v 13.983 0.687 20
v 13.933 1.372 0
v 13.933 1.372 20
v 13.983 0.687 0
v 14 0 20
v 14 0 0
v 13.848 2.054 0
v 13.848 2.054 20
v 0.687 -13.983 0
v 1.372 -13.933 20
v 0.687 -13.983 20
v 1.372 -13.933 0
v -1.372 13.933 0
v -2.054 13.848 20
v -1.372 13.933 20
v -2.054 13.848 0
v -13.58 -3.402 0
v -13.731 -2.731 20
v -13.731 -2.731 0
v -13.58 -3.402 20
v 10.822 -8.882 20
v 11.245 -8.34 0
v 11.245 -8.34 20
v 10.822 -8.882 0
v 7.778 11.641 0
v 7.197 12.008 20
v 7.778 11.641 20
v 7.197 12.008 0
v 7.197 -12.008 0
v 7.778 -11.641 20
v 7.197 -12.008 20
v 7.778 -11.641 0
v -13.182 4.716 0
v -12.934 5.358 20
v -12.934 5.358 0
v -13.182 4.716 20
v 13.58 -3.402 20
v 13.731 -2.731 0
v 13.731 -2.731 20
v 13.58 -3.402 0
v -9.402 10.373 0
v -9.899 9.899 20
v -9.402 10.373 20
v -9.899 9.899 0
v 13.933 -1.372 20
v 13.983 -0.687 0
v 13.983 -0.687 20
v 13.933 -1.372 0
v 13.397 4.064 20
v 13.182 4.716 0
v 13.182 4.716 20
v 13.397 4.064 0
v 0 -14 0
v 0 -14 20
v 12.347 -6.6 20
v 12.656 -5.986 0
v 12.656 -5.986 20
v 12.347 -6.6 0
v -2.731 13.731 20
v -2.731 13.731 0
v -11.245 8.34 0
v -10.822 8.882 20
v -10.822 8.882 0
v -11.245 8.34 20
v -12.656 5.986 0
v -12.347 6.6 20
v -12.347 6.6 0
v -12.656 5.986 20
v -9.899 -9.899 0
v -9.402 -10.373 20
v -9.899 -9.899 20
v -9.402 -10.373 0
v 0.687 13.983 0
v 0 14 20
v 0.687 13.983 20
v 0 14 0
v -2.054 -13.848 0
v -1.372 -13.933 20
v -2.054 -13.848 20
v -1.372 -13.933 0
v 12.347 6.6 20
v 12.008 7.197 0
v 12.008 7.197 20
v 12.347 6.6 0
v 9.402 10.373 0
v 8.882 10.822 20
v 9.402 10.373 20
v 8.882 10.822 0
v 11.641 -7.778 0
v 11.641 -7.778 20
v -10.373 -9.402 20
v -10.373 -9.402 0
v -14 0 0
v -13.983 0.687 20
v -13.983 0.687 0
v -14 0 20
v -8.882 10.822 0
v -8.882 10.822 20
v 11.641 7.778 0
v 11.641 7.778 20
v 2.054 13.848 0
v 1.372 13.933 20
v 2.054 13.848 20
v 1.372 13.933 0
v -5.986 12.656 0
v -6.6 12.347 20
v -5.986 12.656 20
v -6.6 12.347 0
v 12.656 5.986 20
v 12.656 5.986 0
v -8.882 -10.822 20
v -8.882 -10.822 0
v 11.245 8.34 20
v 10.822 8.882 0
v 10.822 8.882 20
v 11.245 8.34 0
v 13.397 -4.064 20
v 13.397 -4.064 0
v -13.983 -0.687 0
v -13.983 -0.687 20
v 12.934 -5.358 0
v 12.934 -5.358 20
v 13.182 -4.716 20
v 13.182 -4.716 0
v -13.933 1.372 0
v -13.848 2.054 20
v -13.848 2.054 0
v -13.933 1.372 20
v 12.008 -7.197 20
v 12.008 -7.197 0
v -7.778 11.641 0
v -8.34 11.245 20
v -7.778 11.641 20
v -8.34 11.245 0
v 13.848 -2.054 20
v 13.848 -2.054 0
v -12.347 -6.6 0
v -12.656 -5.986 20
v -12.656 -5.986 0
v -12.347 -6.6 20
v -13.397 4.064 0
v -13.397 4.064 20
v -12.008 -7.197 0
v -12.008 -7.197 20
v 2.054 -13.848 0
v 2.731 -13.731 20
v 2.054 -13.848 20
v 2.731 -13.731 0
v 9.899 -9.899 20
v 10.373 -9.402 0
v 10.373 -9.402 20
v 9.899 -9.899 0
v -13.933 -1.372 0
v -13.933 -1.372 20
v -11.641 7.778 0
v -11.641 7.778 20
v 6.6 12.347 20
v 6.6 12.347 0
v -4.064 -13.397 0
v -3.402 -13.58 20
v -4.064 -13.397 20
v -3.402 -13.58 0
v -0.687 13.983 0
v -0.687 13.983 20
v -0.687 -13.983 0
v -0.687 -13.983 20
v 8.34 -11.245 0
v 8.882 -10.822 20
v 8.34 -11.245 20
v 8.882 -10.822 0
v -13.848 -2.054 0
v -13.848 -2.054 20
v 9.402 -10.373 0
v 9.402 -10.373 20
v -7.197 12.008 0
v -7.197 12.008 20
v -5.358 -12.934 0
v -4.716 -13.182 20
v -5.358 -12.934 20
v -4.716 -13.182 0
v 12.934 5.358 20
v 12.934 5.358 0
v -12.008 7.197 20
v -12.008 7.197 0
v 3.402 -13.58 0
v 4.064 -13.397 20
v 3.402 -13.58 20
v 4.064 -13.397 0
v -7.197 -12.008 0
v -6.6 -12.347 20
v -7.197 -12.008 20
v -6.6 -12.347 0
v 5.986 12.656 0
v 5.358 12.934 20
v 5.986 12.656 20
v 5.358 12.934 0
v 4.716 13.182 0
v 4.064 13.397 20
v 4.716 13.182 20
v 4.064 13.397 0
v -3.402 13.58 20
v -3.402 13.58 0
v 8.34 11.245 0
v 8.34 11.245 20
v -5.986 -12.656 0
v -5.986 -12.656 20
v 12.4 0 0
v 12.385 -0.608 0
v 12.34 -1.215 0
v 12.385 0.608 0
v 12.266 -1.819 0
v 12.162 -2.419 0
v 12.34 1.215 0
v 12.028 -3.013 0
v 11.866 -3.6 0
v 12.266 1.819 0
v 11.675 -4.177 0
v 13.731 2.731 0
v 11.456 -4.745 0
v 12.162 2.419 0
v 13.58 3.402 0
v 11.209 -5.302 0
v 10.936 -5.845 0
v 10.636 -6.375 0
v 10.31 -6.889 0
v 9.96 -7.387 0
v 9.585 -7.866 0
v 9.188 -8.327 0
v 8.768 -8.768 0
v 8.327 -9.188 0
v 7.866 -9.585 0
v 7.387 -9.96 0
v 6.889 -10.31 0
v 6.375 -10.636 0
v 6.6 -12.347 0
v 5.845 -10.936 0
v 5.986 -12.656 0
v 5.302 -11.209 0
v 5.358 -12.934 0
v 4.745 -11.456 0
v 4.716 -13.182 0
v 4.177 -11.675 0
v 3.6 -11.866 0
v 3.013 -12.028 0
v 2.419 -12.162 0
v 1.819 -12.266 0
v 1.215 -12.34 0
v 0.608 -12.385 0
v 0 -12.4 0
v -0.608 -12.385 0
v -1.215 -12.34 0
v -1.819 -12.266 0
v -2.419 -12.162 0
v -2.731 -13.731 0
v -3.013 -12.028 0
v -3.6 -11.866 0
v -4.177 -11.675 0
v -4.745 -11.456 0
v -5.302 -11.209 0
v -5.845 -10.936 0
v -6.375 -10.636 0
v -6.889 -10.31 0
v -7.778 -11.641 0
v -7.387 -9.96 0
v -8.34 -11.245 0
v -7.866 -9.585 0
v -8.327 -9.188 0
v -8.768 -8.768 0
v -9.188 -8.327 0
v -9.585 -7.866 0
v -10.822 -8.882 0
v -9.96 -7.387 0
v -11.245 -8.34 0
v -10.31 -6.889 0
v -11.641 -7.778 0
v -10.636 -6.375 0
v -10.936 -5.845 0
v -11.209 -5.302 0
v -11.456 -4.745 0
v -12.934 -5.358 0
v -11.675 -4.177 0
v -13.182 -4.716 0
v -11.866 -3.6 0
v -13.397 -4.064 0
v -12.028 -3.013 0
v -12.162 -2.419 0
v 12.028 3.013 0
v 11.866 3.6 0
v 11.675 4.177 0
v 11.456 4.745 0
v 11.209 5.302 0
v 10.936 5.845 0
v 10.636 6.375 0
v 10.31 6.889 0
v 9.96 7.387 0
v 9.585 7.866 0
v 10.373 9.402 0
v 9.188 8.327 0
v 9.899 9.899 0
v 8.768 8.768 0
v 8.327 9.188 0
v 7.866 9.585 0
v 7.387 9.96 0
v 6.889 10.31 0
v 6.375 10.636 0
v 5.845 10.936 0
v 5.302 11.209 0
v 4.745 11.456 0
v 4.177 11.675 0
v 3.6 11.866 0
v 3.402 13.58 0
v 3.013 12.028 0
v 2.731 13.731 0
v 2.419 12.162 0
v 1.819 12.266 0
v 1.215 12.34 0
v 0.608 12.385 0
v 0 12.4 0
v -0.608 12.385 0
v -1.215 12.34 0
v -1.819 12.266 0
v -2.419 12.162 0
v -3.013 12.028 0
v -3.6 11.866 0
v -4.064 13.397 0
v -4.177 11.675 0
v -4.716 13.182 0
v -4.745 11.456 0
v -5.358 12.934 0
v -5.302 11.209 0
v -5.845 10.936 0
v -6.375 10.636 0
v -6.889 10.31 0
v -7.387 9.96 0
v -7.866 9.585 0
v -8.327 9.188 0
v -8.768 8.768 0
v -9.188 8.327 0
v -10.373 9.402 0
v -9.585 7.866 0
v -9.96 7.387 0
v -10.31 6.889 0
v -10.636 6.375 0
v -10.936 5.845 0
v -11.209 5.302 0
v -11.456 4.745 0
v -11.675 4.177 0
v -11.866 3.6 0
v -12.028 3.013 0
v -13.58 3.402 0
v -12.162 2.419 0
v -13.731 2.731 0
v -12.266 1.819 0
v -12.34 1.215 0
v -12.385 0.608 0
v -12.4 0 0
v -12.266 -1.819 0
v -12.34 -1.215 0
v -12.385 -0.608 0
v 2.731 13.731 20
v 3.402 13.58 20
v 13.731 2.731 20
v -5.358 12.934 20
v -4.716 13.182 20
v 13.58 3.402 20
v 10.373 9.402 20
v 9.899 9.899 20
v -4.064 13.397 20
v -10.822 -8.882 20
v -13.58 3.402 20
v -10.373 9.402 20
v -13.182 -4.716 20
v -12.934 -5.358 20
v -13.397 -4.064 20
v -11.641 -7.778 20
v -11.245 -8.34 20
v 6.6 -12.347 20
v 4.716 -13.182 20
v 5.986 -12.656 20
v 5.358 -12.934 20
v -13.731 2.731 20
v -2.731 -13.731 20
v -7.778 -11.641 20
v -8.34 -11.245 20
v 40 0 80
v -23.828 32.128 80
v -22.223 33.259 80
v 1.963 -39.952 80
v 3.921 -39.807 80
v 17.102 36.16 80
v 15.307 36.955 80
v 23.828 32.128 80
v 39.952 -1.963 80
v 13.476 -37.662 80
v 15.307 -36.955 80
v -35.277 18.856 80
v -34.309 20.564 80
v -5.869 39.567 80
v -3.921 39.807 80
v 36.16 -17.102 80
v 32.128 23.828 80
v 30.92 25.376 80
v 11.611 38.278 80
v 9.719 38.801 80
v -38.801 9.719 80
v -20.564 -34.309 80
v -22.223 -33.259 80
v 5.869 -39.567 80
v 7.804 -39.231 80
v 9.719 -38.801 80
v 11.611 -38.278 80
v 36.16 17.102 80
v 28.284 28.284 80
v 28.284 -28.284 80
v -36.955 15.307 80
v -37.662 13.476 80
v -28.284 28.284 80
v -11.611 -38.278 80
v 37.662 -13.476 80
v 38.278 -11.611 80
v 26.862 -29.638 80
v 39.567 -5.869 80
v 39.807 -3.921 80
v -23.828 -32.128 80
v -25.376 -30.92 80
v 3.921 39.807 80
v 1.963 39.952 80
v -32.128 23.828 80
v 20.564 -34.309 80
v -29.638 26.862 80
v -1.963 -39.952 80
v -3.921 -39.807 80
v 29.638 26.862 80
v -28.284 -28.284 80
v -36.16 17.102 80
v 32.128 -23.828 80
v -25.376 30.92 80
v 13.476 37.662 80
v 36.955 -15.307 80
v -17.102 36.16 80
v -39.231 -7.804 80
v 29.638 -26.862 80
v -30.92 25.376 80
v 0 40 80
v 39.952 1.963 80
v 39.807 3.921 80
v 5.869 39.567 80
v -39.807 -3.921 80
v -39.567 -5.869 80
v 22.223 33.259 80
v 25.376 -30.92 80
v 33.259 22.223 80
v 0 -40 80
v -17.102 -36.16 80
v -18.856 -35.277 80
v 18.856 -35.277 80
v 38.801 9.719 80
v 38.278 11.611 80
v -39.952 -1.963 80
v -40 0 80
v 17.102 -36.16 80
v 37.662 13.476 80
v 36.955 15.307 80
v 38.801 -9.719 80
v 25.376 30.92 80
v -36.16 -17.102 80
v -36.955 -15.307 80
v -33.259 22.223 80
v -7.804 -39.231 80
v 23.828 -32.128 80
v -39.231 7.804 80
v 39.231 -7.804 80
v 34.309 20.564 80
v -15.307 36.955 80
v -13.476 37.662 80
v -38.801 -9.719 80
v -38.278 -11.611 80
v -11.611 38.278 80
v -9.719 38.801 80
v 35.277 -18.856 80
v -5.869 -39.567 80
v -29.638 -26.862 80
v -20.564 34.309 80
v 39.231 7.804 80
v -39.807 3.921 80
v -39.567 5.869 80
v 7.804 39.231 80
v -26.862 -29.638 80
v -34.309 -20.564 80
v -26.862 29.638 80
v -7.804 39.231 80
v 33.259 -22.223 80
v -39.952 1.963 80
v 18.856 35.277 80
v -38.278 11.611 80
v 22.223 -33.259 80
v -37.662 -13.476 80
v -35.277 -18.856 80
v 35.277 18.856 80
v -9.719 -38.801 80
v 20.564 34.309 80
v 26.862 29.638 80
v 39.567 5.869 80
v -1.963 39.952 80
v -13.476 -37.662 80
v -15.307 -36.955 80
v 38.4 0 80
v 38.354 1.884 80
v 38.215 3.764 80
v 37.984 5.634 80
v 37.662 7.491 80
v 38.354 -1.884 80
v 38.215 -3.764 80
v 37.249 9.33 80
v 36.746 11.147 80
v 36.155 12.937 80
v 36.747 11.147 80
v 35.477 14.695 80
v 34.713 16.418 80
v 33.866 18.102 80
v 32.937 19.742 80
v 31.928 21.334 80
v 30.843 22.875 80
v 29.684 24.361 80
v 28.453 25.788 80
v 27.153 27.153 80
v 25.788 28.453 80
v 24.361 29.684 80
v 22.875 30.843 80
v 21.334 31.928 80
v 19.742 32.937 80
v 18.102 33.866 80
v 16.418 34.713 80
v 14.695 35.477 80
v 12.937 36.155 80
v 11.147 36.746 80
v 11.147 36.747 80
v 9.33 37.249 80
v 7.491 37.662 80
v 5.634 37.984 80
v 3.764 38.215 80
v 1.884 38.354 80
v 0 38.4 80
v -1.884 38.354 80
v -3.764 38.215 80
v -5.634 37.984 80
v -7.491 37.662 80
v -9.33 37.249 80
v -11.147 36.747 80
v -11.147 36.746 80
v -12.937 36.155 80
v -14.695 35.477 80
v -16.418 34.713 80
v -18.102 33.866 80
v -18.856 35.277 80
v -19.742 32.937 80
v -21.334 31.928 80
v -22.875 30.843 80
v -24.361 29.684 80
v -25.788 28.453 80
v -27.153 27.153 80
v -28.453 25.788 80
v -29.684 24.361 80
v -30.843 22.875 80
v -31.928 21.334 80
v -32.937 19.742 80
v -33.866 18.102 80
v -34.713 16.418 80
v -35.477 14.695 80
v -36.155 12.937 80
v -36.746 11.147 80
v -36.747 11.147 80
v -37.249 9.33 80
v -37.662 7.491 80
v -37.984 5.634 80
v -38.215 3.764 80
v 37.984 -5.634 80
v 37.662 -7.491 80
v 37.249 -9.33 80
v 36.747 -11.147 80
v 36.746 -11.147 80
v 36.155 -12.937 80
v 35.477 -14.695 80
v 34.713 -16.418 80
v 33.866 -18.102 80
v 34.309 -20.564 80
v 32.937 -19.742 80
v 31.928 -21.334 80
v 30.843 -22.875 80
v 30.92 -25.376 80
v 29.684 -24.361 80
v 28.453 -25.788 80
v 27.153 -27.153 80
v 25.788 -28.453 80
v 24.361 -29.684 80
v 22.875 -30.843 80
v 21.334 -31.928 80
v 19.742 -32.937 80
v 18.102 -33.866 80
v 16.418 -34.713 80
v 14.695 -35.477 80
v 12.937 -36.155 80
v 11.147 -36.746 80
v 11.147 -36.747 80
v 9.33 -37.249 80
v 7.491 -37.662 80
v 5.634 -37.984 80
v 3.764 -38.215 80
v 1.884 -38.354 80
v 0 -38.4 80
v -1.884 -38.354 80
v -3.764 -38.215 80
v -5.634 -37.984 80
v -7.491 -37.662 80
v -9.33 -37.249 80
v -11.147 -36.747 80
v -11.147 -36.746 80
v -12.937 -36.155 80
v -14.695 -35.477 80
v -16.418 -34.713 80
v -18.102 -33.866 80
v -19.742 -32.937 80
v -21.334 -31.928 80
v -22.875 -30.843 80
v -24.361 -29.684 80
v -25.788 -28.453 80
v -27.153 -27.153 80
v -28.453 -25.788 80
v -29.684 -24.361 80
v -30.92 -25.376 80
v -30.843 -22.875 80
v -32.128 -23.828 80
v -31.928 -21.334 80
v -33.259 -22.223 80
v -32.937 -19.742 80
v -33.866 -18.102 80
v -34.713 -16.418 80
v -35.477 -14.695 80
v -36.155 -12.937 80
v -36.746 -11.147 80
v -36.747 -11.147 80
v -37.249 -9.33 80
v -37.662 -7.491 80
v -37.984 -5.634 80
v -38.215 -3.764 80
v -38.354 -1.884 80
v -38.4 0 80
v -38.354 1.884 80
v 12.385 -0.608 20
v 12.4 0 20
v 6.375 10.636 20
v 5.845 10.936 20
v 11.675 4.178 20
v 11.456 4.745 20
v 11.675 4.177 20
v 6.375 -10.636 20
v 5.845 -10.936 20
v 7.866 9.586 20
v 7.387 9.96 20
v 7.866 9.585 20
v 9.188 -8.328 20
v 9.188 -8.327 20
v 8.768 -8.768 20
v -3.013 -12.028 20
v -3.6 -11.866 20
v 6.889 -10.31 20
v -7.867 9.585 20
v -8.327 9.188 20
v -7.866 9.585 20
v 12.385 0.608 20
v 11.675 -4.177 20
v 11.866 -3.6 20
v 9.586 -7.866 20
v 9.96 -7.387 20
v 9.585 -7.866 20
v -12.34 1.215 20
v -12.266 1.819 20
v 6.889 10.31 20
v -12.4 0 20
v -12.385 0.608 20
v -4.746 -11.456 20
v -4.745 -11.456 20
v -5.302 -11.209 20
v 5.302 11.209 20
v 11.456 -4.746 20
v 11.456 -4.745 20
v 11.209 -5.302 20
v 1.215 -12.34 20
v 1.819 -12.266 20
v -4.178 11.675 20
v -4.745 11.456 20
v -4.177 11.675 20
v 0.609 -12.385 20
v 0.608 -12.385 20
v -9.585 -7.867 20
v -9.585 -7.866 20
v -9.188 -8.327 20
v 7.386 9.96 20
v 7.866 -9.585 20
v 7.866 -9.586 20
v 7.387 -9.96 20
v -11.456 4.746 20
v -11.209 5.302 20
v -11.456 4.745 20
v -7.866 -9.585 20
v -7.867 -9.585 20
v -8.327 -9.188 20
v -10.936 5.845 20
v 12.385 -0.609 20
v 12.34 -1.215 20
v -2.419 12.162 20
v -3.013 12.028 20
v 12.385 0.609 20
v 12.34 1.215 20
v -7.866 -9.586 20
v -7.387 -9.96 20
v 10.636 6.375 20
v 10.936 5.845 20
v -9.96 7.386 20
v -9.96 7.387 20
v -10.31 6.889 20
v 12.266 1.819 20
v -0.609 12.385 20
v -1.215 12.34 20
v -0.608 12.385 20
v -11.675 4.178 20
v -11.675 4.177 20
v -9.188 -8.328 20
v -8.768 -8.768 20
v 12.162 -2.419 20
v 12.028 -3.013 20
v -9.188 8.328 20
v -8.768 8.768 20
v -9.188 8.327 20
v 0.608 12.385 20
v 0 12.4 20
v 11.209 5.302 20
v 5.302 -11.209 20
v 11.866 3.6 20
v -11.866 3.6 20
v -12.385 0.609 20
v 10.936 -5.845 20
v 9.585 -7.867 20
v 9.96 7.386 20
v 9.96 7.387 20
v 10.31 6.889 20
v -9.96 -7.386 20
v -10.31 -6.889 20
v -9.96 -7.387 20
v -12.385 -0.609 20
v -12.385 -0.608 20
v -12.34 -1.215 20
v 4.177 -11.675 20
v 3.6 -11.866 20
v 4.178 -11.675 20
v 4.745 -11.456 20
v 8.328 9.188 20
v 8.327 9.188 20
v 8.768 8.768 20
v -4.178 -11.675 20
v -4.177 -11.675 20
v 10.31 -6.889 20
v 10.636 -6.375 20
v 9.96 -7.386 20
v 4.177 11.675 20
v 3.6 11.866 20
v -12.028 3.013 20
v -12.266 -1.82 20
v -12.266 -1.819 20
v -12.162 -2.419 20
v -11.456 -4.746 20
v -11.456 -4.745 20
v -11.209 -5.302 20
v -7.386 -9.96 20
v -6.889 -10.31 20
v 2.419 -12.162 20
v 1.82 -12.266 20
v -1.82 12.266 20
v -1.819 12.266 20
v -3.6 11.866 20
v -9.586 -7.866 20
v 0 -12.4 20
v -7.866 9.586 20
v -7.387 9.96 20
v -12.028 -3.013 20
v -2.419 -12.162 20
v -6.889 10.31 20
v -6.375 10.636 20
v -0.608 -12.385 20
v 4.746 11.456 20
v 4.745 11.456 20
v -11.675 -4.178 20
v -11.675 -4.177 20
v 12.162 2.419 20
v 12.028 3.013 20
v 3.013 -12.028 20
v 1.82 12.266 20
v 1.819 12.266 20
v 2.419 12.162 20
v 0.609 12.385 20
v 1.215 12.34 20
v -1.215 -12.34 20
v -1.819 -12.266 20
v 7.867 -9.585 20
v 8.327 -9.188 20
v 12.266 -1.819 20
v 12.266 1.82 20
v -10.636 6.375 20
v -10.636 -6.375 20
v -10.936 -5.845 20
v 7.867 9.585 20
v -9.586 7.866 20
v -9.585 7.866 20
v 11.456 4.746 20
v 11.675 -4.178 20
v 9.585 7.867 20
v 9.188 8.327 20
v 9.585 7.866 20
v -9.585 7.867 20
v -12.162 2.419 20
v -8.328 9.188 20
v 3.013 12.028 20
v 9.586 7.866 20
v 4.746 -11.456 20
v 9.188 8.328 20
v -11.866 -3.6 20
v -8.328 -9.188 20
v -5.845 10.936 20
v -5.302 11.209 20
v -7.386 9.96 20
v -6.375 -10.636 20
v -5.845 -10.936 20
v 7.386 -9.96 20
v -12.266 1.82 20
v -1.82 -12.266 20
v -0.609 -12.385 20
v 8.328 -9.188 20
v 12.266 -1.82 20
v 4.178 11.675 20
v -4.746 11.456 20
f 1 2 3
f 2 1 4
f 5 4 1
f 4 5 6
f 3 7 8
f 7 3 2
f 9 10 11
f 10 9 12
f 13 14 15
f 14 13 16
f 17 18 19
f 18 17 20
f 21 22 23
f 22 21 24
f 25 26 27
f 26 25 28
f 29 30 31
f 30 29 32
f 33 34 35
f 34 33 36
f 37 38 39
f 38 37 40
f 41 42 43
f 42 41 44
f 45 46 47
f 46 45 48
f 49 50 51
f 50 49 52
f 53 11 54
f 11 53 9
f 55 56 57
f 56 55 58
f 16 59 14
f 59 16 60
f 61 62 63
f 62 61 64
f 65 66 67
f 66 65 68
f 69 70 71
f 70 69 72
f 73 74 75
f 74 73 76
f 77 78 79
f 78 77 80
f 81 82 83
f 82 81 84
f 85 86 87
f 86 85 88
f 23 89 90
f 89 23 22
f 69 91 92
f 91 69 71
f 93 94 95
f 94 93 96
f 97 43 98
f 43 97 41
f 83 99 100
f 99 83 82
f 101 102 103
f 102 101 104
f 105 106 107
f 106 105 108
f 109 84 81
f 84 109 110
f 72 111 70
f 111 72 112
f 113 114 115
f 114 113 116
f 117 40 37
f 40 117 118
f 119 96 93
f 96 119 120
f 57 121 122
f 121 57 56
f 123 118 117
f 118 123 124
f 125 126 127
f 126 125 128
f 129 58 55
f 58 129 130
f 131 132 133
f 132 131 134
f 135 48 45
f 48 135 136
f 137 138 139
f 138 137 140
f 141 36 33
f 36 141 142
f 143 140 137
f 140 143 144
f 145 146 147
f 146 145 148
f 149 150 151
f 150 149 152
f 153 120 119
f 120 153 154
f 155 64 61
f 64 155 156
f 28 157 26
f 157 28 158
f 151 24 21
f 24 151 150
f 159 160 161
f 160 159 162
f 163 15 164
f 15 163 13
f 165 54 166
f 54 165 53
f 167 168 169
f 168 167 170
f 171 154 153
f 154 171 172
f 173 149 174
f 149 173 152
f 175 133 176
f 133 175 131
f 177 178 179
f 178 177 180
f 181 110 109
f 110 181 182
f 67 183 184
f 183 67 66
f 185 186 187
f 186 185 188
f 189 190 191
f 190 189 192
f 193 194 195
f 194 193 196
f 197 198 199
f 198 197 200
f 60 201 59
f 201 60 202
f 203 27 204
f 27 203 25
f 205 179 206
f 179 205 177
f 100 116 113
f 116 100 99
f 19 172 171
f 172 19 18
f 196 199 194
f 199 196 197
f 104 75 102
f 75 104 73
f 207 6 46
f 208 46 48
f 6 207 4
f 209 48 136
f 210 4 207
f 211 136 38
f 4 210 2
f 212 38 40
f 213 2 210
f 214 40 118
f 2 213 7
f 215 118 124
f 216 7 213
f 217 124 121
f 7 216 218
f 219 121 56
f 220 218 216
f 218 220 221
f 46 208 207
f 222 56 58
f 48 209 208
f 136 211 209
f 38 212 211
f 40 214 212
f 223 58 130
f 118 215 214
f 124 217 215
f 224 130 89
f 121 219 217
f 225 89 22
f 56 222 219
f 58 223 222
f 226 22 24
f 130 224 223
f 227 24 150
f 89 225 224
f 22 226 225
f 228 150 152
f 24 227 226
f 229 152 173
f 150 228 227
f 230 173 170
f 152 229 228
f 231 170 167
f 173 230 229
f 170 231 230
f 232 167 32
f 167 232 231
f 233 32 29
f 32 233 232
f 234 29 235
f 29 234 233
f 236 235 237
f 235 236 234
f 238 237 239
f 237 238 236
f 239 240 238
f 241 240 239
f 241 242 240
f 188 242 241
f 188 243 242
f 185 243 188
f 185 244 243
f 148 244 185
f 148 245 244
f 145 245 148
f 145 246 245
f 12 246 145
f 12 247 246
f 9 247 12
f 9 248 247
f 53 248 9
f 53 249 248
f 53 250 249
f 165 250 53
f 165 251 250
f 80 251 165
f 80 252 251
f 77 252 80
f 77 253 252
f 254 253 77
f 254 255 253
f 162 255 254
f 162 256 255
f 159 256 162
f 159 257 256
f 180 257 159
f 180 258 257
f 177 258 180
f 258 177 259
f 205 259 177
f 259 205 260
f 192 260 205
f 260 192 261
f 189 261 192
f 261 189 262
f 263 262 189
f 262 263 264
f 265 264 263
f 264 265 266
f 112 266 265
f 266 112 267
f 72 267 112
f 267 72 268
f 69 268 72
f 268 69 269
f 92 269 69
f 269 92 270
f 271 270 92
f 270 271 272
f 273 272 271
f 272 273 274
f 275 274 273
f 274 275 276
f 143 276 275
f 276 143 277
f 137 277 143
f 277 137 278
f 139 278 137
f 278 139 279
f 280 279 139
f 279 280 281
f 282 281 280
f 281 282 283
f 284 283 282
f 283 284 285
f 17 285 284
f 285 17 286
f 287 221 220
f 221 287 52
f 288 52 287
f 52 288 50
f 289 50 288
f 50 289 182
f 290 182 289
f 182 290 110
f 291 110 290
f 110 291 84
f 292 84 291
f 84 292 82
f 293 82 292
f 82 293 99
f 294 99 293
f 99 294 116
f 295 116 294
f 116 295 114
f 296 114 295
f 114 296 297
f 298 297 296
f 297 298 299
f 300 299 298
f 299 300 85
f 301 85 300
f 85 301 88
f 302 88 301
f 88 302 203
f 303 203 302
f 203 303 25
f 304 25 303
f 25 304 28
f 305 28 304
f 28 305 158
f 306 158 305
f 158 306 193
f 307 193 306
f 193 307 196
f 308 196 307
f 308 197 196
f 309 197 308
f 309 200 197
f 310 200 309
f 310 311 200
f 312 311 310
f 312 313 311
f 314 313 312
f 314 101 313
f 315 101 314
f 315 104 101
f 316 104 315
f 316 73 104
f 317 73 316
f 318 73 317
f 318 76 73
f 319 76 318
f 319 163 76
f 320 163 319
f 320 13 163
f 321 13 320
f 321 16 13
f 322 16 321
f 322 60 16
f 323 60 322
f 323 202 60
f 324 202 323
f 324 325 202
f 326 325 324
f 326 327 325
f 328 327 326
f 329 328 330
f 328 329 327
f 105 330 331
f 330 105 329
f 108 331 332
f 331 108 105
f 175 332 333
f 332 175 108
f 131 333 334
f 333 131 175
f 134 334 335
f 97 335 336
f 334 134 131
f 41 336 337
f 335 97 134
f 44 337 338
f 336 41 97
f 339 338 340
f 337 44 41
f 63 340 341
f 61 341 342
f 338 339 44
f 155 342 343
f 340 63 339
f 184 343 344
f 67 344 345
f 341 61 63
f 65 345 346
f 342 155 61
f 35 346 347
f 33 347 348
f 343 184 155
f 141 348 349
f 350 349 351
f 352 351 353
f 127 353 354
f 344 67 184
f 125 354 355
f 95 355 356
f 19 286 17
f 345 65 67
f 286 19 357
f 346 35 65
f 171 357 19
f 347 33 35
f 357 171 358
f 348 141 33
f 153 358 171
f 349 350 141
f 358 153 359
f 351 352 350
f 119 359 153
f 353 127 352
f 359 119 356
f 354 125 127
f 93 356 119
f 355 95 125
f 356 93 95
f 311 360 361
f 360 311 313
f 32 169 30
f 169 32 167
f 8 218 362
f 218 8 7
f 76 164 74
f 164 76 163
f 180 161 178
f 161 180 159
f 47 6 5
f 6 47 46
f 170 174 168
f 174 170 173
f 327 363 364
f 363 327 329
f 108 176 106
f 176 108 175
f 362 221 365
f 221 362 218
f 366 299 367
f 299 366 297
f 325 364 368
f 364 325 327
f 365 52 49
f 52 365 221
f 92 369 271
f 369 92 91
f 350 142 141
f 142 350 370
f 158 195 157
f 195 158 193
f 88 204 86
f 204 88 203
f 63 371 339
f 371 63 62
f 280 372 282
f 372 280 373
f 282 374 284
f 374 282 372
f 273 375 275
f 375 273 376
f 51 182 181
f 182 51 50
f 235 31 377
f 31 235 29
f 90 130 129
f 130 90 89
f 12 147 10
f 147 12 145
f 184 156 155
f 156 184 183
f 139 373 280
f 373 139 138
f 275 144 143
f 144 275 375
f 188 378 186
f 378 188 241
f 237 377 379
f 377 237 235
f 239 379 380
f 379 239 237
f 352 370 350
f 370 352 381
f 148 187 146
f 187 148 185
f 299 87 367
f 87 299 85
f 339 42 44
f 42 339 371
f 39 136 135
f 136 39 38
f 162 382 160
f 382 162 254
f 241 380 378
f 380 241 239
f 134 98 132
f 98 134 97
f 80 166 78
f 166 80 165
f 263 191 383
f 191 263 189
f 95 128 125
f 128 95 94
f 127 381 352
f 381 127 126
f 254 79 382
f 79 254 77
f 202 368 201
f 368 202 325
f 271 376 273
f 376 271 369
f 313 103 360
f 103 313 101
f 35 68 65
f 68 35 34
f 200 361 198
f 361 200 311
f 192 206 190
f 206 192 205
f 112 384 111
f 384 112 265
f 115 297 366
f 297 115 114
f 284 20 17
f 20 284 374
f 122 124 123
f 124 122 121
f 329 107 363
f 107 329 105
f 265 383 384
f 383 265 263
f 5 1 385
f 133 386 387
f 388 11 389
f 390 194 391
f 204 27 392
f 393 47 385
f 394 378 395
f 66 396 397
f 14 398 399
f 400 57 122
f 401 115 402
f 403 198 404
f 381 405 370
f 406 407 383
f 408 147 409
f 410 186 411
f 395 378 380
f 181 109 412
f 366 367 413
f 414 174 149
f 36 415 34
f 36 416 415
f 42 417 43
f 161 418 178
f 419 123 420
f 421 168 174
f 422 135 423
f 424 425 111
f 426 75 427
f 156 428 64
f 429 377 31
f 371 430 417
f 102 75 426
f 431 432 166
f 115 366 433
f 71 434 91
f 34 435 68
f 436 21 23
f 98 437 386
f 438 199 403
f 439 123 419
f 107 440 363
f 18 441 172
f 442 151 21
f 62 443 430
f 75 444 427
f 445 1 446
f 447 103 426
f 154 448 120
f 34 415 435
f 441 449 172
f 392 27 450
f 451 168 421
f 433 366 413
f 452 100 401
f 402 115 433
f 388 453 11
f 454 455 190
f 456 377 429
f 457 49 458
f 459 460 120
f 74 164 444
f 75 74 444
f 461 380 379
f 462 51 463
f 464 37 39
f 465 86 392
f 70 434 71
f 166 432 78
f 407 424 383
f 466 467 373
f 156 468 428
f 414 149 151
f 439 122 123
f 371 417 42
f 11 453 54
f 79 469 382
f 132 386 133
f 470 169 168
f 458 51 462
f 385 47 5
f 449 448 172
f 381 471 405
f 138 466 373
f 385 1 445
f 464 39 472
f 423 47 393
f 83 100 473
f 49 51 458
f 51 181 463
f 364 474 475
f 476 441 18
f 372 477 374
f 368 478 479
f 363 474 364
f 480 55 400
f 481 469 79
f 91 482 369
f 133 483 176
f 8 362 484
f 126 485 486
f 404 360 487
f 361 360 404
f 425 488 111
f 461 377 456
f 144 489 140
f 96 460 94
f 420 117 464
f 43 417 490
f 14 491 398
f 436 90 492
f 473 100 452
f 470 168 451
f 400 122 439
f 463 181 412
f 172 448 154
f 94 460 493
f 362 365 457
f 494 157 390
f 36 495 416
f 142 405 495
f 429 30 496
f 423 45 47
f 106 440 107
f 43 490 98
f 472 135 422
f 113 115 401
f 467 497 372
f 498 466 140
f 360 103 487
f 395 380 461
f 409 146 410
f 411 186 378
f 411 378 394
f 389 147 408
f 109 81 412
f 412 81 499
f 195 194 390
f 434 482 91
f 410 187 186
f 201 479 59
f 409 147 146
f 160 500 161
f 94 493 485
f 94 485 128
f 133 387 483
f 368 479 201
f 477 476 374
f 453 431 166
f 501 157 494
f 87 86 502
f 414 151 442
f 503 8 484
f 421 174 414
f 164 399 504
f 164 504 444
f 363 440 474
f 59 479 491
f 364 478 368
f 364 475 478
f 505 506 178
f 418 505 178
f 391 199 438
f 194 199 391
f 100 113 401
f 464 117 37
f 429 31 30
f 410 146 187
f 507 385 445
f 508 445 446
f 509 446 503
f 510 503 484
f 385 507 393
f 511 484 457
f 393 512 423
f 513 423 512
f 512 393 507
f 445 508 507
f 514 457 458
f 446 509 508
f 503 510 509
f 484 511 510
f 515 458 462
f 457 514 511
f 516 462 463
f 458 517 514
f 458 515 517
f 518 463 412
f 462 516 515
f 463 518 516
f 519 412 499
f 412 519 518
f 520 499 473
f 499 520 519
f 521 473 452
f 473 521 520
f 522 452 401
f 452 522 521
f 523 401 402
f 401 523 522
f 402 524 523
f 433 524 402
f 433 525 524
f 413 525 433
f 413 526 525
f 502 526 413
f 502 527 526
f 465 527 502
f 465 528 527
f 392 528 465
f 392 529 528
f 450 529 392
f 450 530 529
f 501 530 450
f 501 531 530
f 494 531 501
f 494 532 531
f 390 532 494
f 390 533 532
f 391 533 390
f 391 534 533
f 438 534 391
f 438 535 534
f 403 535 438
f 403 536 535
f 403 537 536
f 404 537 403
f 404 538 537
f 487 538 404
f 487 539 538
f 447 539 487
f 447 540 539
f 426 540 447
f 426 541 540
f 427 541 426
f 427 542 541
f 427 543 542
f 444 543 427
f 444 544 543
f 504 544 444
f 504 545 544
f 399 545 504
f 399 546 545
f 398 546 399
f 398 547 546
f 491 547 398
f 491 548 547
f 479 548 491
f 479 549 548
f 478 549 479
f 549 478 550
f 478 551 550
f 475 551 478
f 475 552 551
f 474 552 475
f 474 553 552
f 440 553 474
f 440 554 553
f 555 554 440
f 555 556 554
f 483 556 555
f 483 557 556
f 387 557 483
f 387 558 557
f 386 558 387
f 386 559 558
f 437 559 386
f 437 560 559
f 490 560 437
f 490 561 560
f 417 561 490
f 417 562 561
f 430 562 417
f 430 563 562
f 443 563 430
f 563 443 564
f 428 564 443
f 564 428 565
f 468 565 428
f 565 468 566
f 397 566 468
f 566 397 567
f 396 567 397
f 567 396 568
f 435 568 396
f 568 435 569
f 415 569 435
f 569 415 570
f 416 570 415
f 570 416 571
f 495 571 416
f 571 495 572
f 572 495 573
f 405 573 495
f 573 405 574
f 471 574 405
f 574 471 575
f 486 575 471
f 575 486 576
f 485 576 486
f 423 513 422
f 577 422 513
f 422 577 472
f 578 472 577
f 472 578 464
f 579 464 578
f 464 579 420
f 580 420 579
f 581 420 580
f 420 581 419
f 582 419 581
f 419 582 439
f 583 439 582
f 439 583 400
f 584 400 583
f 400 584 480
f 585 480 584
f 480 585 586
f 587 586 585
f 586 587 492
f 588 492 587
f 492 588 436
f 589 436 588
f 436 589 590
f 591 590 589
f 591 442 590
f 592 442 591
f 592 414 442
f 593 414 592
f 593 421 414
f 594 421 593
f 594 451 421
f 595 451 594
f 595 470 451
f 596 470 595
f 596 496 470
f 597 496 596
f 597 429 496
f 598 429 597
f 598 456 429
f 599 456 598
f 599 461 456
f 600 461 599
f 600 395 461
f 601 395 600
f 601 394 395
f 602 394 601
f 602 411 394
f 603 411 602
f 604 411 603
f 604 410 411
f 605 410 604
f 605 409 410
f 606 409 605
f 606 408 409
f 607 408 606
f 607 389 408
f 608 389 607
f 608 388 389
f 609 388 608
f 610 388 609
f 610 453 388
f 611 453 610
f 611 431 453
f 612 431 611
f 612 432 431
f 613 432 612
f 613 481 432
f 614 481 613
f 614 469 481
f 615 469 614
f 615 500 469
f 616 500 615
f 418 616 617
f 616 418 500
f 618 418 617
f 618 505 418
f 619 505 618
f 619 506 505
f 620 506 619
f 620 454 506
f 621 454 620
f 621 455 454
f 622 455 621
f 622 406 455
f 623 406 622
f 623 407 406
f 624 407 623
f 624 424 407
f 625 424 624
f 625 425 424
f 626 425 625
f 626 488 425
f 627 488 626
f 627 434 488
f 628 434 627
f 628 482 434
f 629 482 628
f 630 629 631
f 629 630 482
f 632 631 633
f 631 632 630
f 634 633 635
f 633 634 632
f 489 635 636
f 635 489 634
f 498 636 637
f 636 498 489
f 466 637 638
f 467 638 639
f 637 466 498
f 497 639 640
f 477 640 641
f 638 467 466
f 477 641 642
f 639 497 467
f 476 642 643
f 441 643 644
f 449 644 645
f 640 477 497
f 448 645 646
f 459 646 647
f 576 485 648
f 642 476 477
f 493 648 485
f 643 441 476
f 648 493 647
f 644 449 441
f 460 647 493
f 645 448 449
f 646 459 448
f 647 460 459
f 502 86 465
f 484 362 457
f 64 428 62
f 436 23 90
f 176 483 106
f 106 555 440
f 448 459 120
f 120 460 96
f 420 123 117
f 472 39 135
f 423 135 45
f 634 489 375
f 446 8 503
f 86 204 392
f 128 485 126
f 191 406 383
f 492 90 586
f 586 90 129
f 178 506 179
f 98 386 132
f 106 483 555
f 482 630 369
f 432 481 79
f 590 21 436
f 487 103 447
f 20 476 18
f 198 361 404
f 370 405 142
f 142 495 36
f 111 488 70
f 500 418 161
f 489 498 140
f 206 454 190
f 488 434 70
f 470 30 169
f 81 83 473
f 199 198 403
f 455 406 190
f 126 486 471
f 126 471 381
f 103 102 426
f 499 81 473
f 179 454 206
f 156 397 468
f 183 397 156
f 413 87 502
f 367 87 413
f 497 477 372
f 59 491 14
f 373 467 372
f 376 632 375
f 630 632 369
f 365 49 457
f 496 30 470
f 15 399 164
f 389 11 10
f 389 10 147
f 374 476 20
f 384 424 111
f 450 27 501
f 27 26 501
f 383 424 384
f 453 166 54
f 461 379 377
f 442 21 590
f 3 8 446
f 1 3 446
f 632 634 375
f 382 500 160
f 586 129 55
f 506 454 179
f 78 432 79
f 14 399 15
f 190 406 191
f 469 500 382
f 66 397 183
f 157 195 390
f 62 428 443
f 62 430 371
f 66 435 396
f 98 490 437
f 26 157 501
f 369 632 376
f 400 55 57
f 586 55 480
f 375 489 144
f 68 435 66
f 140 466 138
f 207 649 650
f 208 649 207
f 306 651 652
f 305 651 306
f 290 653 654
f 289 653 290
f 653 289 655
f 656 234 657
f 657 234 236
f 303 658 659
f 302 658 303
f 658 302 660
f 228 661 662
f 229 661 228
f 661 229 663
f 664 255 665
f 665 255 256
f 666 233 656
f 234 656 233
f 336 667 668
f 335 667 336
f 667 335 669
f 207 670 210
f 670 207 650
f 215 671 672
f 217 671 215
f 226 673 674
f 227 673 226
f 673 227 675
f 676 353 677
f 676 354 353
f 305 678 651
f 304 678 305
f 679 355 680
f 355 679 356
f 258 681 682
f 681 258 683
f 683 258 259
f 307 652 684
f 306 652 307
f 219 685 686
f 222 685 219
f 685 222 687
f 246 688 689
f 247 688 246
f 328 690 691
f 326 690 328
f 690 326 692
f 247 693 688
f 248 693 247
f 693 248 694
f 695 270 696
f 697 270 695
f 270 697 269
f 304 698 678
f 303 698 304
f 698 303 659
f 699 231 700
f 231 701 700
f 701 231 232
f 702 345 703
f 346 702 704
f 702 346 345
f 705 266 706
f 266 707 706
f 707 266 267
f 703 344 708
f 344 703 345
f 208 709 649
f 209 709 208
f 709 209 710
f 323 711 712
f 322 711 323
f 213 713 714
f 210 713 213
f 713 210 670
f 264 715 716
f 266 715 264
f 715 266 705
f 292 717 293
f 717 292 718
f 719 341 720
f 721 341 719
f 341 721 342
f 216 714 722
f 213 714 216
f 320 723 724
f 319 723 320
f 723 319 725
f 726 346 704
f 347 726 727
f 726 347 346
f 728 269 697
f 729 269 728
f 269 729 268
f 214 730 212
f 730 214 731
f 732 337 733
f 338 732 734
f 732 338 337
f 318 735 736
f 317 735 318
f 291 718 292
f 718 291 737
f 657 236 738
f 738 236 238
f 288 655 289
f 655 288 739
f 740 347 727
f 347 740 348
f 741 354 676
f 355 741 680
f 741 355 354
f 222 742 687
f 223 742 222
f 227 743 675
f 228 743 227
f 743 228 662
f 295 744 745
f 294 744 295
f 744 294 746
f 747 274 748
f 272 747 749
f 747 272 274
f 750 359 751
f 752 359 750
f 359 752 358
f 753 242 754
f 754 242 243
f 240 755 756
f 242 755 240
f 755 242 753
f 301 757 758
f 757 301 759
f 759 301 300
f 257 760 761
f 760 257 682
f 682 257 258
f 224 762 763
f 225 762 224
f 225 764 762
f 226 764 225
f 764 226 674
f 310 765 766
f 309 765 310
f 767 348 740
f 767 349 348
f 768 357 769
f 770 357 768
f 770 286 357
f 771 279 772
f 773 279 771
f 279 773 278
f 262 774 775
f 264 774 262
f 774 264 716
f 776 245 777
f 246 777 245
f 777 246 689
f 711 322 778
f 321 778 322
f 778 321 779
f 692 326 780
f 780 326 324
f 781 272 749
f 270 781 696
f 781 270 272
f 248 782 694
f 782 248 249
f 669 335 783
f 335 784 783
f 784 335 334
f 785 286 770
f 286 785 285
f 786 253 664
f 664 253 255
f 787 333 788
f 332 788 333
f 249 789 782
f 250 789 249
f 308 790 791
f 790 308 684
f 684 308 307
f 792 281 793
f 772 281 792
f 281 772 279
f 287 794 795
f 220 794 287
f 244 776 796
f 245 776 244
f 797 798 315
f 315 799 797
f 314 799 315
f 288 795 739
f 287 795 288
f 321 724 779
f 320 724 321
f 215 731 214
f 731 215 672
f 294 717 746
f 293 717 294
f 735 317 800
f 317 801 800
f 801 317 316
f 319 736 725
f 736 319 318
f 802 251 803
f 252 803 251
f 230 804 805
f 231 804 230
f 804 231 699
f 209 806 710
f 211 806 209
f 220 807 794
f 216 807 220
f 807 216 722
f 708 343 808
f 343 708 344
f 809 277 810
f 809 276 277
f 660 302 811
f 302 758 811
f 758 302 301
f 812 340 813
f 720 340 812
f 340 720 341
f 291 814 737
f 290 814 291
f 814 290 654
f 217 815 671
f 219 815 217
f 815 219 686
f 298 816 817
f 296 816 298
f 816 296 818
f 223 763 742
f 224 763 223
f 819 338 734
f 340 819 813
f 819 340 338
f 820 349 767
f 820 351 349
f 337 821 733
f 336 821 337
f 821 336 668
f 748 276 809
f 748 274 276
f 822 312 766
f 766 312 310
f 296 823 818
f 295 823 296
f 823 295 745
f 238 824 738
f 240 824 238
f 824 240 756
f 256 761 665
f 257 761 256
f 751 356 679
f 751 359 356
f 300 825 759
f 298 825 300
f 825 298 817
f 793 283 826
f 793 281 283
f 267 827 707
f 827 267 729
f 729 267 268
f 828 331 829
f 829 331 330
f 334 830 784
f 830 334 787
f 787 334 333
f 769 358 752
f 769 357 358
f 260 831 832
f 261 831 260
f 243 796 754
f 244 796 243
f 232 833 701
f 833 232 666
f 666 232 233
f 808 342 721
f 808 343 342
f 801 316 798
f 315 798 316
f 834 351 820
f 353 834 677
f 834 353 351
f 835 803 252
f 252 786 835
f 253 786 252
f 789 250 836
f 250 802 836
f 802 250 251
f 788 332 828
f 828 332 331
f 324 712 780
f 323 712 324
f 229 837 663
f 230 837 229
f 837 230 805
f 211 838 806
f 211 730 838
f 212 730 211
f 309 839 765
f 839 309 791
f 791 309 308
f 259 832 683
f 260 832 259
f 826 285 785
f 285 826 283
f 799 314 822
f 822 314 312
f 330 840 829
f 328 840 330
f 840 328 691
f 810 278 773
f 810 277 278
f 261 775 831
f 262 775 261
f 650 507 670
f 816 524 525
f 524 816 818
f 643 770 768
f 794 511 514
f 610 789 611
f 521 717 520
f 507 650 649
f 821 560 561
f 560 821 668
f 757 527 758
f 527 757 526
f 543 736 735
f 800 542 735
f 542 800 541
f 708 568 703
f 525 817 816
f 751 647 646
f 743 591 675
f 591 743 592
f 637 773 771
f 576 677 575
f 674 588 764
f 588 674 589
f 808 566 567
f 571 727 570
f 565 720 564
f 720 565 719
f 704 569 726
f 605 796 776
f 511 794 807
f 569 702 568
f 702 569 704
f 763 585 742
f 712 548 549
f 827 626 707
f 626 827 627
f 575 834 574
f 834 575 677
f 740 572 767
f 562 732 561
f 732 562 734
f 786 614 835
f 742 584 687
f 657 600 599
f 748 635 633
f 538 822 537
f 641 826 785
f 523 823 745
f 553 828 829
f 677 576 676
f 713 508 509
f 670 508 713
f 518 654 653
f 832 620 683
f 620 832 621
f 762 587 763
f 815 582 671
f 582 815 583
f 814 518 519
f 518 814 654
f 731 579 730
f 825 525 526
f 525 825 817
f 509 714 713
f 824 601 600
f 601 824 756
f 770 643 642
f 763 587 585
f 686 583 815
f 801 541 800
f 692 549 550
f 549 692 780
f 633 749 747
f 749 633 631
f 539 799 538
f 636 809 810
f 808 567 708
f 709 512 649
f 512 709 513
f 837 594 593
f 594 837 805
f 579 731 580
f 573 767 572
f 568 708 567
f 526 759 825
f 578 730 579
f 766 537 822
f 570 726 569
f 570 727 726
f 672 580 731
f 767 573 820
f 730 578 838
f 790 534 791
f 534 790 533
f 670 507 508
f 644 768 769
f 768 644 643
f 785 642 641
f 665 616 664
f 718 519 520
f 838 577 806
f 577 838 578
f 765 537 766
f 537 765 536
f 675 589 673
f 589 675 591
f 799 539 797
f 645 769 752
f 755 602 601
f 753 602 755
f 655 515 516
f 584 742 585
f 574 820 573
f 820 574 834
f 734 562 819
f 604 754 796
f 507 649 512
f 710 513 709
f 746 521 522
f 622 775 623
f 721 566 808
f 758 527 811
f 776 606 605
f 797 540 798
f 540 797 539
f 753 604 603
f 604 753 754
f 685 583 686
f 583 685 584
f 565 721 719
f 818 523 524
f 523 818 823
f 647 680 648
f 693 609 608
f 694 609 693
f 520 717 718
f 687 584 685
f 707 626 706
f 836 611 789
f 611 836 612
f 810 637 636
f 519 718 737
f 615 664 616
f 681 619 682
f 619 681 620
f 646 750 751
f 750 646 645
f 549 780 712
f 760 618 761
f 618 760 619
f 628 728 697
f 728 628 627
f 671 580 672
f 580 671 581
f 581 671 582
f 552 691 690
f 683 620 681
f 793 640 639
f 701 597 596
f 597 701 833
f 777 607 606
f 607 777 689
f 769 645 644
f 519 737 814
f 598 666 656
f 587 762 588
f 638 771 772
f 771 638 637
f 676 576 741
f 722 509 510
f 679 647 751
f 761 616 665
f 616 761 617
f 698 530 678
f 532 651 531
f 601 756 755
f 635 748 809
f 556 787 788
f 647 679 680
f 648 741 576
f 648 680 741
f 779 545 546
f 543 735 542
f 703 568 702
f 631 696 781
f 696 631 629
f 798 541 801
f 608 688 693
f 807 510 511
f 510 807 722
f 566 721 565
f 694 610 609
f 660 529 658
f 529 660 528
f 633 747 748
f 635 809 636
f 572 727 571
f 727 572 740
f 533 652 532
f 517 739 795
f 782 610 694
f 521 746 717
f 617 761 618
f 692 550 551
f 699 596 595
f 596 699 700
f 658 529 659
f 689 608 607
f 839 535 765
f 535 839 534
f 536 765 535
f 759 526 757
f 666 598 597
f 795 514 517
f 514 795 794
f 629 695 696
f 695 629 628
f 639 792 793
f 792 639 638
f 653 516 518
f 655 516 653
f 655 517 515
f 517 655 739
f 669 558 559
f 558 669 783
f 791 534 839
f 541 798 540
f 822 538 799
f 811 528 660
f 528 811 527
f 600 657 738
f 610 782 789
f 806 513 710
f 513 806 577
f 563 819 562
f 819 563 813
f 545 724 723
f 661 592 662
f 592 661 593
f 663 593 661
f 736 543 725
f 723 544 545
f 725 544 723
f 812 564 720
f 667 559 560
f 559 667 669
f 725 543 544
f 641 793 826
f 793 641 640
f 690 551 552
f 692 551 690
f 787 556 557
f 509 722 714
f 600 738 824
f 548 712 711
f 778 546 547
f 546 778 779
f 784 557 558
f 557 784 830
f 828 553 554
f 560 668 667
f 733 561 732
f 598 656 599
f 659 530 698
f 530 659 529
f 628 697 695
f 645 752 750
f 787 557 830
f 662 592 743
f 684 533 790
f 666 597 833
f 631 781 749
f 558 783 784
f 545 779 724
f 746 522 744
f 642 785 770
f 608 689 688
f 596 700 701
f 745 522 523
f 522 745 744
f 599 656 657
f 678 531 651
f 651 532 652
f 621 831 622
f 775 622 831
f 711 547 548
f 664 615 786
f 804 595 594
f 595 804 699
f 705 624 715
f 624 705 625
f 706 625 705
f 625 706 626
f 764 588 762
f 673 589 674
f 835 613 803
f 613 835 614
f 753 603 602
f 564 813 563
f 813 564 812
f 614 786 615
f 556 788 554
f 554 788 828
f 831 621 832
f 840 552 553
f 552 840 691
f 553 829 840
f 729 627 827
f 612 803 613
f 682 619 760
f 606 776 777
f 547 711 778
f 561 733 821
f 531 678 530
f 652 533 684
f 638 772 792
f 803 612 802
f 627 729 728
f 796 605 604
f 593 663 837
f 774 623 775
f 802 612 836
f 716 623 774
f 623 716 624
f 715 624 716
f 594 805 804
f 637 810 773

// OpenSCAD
// file: modules/utils.scad
////////////////////////////////////////////////////////////////////////////////////////////////////////////////////////

BUILD_PLATE_X = 256.0;
BUILD_PLATE_Y = 256.0;
BUILD_PLATE_Z = 256.0;

BUILD_PREVIEW_WIDTH = 0.01;

DIFFERENCE_CLEARANCE = 0.01;

DIFFERENCE_OFFSET = 0.1;

////////////////////////////////////////////////////////////////////////////////////////////////////////////////////////
// show a preview of the build plate

module BuildPlatePreview()
{
    % translate([ 0, 0, -BUILD_PREVIEW_WIDTH ])
        cube([ BUILD_PLATE_X, BUILD_PLATE_Y, BUILD_PREVIEW_WIDTH ]);
}

////////////////////////////////////////////////////////////////////////////////////////////////////////////////////////
// list, sum and spacing functions

function Reverse( list ) = [ for( i = [ len( list ) - 1 : -1 : 0 ] ) list[ i ] ];

// sum up the values in the given list
function SumList( list ) = _SumListHelper( list, 0 );
function _SumListHelper( list, n ) = n >= len( list ) ? 0 : list[ n ] + _SumListHelper( list, n + 1 );

// sum up the values in the given list from indicies 0..i (inclusive)
function SumTo( list, i ) = _SumToHelper( list, i, 0 );
function _SumToHelper( list, i, n ) = n >= i || n >= len( list ) ? 0 : list[ n ] + _SumToHelper( list, i, n + 1 );

function GetListAtIndex( list, i ) = [ for ( entry = list ) entry[ i ] ];

// adds val_to_add to each index of the given list, returning a new list
function AddValueToEachIndex( list, val_to_add ) = [ for( entry = list ) entry + val_to_add ];

// for each size in list, adds up the size and the equally spaces them in the total_size with the given clearance factored in
function CalculateEquallySpacedOffset( list, total_size, clearance, i ) =
    let( sizes_with_clearance = AddValueToEachIndex( list, clearance * 2 ) )
    let( spacing = ( total_size - SumList( sizes_with_clearance ) ) / ( len( list ) + 1 ) )
    spacing * ( i + 1 ) + SumTo( sizes_with_clearance, i );

// like CalculateEquallySpacedOffset, but takes a list of radiuses and returns the center offset of item i
function CalculateEquallySpacedOffsetRadiuses( list, total_size, clearance, i ) =
    let( footprints = AddValueToEachIndex( list, clearance ) * 2 )
    let( spacing = ( total_size - SumList( footprints ) ) / ( len( list ) + 1 ) )
    spacing * ( i + 1 ) + SumTo( footprints, i ) + clearance + list[ i ];

// function calculateEquallySpacedOffset( total_size, count, i, item_size ) = ( i + 1 ) / ( count + 1 ) * total_size - item_size / 2;

function CalculateOffsetToCenter( total_size, item_size ) = total_size / 2 - item_size / 2;

////////////////////////////////////////////////////////////////////////////////////////////////////////////////////////
// rotate so that we can draw an object from one point to the next

module RotateFromPointAtoB( a, b )
{
    // from: https://en.wikibooks.org/wiki/OpenSCAD_User_Manual/Transformations

    x = b[ 0 ] - a[ 0 ];
    y = b[ 1 ] - a[ 1 ];
    z = b[ 2 ] - a[ 2 ];

    length = norm([ x, y, z ]);
    b = acos( z / length );
    c = atan2( y, x );

    rotate([ 0, b, c ])
        children();
}

////////////////////////////////////////////////////////////////////////////////////////////////////////////////////////

function RotatePointAboutPoint( rotateThisPoint, aboutThisPoint, angle ) =
    let( xdiff = rotateThisPoint.x - aboutThisPoint.x )
    let( ydiff = rotateThisPoint.y - aboutThisPoint.y )
    [
        aboutThisPoint.x + xdiff * cos( angle ) - ydiff * sin( angle ),
        aboutThisPoint.y + xdiff * sin( angle ) + ydiff * cos( angle ),
    ];

////////////////////////////////////////////////////////////////////////////////////////////////////////////////////////
// returns [ m, b ] in slope intercept form y = mx + b

function FindSlopeIntercept( pointA, pointB ) =
    let( m = ( pointB.y - pointA.y ) / ( pointB.x - pointA.x ) )
    let( b = pointA.y - m * pointA.x )
    [ m, b ];

////////////////////////////////////////////////////////////////////////////////////////////////////////////////////////

module OptionalColor( color = false )
{
    if( color )
    {
        color( color )
            children();
    }
    else
    {
        children();
    }
}

////////////////////////////////////////////////////////////////////////////////////////////////////////////////////////
// main file
include <modules/utils.scad>

////////////////////////////////////////////////////////////////////////////////////////////////////////////////////////
// measurements

funnel_tip_r = 24.8 / 2;

////////////////////////////////////////////////////////////////////////////////////////////////////////////////////////
// settings

render_mode = "preview";
// render_mode = "print";

funnel_r = 80 / 2;

funnel_wall_width = 1.6;

funnel_z = 80;
funnel_tip_z = 20;

////////////////////////////////////////////////////////////////////////////////////////////////////////////////////////
// calculations

$fn = $preview ? 32 : 128;
funnel_cone_slope = ( funnel_r - funnel_tip_r - funnel_wall_width ) / ( funnel_z - funnel_tip_z );

////////////////////////////////////////////////////////////////////////////////////////////////////////////////////////
// models

if( render_mode == "preview" )
{
    DesiccantFunnel();
}
else if( render_mode == "print" )
{
    translate([ 0, 0, funnel_z ])
        rotate([ 180, 0, 0 ])
            DesiccantFunnel();
}
else
{
    assert( false, str( "Unknown render mode: ", render_mode ) );
}

////////////////////////////////////////////////////////////////////////////////////////////////////////////////////////

module DesiccantFunnel()
{
    difference()
    {
        union()
        {
            cylinder(
                r = funnel_tip_r + funnel_wall_width,
                h = funnel_tip_z
                );

            translate([ 0, 0, funnel_tip_z ])
                cylinder(
                    h = funnel_z - funnel_tip_z,
                    r1 = funnel_tip_r + funnel_wall_width,
                    r2 = funnel_r
                    );
        }

        union()
        {
            translate([ 0, 0, -DIFFERENCE_CLEARANCE ])
                cylinder(
                    r = funnel_tip_r,
                    h = funnel_tip_z + DIFFERENCE_CLEARANCE * 2
                    );

            translate([ 0, 0, funnel_tip_z - DIFFERENCE_CLEARANCE ])
                cylinder(
                    h = funnel_z - funnel_tip_z + DIFFERENCE_CLEARANCE * 2,
                    r1 = funnel_tip_r - funnel_cone_slope * DIFFERENCE_CLEARANCE,
                    r2 = funnel_r - funnel_wall_width + funnel_cone_slope * DIFFERENCE_CLEARANCE
                    );
        }
    }
}

////////////////////////////////////////////////////////////////////////////////////////////////////////////////////////
